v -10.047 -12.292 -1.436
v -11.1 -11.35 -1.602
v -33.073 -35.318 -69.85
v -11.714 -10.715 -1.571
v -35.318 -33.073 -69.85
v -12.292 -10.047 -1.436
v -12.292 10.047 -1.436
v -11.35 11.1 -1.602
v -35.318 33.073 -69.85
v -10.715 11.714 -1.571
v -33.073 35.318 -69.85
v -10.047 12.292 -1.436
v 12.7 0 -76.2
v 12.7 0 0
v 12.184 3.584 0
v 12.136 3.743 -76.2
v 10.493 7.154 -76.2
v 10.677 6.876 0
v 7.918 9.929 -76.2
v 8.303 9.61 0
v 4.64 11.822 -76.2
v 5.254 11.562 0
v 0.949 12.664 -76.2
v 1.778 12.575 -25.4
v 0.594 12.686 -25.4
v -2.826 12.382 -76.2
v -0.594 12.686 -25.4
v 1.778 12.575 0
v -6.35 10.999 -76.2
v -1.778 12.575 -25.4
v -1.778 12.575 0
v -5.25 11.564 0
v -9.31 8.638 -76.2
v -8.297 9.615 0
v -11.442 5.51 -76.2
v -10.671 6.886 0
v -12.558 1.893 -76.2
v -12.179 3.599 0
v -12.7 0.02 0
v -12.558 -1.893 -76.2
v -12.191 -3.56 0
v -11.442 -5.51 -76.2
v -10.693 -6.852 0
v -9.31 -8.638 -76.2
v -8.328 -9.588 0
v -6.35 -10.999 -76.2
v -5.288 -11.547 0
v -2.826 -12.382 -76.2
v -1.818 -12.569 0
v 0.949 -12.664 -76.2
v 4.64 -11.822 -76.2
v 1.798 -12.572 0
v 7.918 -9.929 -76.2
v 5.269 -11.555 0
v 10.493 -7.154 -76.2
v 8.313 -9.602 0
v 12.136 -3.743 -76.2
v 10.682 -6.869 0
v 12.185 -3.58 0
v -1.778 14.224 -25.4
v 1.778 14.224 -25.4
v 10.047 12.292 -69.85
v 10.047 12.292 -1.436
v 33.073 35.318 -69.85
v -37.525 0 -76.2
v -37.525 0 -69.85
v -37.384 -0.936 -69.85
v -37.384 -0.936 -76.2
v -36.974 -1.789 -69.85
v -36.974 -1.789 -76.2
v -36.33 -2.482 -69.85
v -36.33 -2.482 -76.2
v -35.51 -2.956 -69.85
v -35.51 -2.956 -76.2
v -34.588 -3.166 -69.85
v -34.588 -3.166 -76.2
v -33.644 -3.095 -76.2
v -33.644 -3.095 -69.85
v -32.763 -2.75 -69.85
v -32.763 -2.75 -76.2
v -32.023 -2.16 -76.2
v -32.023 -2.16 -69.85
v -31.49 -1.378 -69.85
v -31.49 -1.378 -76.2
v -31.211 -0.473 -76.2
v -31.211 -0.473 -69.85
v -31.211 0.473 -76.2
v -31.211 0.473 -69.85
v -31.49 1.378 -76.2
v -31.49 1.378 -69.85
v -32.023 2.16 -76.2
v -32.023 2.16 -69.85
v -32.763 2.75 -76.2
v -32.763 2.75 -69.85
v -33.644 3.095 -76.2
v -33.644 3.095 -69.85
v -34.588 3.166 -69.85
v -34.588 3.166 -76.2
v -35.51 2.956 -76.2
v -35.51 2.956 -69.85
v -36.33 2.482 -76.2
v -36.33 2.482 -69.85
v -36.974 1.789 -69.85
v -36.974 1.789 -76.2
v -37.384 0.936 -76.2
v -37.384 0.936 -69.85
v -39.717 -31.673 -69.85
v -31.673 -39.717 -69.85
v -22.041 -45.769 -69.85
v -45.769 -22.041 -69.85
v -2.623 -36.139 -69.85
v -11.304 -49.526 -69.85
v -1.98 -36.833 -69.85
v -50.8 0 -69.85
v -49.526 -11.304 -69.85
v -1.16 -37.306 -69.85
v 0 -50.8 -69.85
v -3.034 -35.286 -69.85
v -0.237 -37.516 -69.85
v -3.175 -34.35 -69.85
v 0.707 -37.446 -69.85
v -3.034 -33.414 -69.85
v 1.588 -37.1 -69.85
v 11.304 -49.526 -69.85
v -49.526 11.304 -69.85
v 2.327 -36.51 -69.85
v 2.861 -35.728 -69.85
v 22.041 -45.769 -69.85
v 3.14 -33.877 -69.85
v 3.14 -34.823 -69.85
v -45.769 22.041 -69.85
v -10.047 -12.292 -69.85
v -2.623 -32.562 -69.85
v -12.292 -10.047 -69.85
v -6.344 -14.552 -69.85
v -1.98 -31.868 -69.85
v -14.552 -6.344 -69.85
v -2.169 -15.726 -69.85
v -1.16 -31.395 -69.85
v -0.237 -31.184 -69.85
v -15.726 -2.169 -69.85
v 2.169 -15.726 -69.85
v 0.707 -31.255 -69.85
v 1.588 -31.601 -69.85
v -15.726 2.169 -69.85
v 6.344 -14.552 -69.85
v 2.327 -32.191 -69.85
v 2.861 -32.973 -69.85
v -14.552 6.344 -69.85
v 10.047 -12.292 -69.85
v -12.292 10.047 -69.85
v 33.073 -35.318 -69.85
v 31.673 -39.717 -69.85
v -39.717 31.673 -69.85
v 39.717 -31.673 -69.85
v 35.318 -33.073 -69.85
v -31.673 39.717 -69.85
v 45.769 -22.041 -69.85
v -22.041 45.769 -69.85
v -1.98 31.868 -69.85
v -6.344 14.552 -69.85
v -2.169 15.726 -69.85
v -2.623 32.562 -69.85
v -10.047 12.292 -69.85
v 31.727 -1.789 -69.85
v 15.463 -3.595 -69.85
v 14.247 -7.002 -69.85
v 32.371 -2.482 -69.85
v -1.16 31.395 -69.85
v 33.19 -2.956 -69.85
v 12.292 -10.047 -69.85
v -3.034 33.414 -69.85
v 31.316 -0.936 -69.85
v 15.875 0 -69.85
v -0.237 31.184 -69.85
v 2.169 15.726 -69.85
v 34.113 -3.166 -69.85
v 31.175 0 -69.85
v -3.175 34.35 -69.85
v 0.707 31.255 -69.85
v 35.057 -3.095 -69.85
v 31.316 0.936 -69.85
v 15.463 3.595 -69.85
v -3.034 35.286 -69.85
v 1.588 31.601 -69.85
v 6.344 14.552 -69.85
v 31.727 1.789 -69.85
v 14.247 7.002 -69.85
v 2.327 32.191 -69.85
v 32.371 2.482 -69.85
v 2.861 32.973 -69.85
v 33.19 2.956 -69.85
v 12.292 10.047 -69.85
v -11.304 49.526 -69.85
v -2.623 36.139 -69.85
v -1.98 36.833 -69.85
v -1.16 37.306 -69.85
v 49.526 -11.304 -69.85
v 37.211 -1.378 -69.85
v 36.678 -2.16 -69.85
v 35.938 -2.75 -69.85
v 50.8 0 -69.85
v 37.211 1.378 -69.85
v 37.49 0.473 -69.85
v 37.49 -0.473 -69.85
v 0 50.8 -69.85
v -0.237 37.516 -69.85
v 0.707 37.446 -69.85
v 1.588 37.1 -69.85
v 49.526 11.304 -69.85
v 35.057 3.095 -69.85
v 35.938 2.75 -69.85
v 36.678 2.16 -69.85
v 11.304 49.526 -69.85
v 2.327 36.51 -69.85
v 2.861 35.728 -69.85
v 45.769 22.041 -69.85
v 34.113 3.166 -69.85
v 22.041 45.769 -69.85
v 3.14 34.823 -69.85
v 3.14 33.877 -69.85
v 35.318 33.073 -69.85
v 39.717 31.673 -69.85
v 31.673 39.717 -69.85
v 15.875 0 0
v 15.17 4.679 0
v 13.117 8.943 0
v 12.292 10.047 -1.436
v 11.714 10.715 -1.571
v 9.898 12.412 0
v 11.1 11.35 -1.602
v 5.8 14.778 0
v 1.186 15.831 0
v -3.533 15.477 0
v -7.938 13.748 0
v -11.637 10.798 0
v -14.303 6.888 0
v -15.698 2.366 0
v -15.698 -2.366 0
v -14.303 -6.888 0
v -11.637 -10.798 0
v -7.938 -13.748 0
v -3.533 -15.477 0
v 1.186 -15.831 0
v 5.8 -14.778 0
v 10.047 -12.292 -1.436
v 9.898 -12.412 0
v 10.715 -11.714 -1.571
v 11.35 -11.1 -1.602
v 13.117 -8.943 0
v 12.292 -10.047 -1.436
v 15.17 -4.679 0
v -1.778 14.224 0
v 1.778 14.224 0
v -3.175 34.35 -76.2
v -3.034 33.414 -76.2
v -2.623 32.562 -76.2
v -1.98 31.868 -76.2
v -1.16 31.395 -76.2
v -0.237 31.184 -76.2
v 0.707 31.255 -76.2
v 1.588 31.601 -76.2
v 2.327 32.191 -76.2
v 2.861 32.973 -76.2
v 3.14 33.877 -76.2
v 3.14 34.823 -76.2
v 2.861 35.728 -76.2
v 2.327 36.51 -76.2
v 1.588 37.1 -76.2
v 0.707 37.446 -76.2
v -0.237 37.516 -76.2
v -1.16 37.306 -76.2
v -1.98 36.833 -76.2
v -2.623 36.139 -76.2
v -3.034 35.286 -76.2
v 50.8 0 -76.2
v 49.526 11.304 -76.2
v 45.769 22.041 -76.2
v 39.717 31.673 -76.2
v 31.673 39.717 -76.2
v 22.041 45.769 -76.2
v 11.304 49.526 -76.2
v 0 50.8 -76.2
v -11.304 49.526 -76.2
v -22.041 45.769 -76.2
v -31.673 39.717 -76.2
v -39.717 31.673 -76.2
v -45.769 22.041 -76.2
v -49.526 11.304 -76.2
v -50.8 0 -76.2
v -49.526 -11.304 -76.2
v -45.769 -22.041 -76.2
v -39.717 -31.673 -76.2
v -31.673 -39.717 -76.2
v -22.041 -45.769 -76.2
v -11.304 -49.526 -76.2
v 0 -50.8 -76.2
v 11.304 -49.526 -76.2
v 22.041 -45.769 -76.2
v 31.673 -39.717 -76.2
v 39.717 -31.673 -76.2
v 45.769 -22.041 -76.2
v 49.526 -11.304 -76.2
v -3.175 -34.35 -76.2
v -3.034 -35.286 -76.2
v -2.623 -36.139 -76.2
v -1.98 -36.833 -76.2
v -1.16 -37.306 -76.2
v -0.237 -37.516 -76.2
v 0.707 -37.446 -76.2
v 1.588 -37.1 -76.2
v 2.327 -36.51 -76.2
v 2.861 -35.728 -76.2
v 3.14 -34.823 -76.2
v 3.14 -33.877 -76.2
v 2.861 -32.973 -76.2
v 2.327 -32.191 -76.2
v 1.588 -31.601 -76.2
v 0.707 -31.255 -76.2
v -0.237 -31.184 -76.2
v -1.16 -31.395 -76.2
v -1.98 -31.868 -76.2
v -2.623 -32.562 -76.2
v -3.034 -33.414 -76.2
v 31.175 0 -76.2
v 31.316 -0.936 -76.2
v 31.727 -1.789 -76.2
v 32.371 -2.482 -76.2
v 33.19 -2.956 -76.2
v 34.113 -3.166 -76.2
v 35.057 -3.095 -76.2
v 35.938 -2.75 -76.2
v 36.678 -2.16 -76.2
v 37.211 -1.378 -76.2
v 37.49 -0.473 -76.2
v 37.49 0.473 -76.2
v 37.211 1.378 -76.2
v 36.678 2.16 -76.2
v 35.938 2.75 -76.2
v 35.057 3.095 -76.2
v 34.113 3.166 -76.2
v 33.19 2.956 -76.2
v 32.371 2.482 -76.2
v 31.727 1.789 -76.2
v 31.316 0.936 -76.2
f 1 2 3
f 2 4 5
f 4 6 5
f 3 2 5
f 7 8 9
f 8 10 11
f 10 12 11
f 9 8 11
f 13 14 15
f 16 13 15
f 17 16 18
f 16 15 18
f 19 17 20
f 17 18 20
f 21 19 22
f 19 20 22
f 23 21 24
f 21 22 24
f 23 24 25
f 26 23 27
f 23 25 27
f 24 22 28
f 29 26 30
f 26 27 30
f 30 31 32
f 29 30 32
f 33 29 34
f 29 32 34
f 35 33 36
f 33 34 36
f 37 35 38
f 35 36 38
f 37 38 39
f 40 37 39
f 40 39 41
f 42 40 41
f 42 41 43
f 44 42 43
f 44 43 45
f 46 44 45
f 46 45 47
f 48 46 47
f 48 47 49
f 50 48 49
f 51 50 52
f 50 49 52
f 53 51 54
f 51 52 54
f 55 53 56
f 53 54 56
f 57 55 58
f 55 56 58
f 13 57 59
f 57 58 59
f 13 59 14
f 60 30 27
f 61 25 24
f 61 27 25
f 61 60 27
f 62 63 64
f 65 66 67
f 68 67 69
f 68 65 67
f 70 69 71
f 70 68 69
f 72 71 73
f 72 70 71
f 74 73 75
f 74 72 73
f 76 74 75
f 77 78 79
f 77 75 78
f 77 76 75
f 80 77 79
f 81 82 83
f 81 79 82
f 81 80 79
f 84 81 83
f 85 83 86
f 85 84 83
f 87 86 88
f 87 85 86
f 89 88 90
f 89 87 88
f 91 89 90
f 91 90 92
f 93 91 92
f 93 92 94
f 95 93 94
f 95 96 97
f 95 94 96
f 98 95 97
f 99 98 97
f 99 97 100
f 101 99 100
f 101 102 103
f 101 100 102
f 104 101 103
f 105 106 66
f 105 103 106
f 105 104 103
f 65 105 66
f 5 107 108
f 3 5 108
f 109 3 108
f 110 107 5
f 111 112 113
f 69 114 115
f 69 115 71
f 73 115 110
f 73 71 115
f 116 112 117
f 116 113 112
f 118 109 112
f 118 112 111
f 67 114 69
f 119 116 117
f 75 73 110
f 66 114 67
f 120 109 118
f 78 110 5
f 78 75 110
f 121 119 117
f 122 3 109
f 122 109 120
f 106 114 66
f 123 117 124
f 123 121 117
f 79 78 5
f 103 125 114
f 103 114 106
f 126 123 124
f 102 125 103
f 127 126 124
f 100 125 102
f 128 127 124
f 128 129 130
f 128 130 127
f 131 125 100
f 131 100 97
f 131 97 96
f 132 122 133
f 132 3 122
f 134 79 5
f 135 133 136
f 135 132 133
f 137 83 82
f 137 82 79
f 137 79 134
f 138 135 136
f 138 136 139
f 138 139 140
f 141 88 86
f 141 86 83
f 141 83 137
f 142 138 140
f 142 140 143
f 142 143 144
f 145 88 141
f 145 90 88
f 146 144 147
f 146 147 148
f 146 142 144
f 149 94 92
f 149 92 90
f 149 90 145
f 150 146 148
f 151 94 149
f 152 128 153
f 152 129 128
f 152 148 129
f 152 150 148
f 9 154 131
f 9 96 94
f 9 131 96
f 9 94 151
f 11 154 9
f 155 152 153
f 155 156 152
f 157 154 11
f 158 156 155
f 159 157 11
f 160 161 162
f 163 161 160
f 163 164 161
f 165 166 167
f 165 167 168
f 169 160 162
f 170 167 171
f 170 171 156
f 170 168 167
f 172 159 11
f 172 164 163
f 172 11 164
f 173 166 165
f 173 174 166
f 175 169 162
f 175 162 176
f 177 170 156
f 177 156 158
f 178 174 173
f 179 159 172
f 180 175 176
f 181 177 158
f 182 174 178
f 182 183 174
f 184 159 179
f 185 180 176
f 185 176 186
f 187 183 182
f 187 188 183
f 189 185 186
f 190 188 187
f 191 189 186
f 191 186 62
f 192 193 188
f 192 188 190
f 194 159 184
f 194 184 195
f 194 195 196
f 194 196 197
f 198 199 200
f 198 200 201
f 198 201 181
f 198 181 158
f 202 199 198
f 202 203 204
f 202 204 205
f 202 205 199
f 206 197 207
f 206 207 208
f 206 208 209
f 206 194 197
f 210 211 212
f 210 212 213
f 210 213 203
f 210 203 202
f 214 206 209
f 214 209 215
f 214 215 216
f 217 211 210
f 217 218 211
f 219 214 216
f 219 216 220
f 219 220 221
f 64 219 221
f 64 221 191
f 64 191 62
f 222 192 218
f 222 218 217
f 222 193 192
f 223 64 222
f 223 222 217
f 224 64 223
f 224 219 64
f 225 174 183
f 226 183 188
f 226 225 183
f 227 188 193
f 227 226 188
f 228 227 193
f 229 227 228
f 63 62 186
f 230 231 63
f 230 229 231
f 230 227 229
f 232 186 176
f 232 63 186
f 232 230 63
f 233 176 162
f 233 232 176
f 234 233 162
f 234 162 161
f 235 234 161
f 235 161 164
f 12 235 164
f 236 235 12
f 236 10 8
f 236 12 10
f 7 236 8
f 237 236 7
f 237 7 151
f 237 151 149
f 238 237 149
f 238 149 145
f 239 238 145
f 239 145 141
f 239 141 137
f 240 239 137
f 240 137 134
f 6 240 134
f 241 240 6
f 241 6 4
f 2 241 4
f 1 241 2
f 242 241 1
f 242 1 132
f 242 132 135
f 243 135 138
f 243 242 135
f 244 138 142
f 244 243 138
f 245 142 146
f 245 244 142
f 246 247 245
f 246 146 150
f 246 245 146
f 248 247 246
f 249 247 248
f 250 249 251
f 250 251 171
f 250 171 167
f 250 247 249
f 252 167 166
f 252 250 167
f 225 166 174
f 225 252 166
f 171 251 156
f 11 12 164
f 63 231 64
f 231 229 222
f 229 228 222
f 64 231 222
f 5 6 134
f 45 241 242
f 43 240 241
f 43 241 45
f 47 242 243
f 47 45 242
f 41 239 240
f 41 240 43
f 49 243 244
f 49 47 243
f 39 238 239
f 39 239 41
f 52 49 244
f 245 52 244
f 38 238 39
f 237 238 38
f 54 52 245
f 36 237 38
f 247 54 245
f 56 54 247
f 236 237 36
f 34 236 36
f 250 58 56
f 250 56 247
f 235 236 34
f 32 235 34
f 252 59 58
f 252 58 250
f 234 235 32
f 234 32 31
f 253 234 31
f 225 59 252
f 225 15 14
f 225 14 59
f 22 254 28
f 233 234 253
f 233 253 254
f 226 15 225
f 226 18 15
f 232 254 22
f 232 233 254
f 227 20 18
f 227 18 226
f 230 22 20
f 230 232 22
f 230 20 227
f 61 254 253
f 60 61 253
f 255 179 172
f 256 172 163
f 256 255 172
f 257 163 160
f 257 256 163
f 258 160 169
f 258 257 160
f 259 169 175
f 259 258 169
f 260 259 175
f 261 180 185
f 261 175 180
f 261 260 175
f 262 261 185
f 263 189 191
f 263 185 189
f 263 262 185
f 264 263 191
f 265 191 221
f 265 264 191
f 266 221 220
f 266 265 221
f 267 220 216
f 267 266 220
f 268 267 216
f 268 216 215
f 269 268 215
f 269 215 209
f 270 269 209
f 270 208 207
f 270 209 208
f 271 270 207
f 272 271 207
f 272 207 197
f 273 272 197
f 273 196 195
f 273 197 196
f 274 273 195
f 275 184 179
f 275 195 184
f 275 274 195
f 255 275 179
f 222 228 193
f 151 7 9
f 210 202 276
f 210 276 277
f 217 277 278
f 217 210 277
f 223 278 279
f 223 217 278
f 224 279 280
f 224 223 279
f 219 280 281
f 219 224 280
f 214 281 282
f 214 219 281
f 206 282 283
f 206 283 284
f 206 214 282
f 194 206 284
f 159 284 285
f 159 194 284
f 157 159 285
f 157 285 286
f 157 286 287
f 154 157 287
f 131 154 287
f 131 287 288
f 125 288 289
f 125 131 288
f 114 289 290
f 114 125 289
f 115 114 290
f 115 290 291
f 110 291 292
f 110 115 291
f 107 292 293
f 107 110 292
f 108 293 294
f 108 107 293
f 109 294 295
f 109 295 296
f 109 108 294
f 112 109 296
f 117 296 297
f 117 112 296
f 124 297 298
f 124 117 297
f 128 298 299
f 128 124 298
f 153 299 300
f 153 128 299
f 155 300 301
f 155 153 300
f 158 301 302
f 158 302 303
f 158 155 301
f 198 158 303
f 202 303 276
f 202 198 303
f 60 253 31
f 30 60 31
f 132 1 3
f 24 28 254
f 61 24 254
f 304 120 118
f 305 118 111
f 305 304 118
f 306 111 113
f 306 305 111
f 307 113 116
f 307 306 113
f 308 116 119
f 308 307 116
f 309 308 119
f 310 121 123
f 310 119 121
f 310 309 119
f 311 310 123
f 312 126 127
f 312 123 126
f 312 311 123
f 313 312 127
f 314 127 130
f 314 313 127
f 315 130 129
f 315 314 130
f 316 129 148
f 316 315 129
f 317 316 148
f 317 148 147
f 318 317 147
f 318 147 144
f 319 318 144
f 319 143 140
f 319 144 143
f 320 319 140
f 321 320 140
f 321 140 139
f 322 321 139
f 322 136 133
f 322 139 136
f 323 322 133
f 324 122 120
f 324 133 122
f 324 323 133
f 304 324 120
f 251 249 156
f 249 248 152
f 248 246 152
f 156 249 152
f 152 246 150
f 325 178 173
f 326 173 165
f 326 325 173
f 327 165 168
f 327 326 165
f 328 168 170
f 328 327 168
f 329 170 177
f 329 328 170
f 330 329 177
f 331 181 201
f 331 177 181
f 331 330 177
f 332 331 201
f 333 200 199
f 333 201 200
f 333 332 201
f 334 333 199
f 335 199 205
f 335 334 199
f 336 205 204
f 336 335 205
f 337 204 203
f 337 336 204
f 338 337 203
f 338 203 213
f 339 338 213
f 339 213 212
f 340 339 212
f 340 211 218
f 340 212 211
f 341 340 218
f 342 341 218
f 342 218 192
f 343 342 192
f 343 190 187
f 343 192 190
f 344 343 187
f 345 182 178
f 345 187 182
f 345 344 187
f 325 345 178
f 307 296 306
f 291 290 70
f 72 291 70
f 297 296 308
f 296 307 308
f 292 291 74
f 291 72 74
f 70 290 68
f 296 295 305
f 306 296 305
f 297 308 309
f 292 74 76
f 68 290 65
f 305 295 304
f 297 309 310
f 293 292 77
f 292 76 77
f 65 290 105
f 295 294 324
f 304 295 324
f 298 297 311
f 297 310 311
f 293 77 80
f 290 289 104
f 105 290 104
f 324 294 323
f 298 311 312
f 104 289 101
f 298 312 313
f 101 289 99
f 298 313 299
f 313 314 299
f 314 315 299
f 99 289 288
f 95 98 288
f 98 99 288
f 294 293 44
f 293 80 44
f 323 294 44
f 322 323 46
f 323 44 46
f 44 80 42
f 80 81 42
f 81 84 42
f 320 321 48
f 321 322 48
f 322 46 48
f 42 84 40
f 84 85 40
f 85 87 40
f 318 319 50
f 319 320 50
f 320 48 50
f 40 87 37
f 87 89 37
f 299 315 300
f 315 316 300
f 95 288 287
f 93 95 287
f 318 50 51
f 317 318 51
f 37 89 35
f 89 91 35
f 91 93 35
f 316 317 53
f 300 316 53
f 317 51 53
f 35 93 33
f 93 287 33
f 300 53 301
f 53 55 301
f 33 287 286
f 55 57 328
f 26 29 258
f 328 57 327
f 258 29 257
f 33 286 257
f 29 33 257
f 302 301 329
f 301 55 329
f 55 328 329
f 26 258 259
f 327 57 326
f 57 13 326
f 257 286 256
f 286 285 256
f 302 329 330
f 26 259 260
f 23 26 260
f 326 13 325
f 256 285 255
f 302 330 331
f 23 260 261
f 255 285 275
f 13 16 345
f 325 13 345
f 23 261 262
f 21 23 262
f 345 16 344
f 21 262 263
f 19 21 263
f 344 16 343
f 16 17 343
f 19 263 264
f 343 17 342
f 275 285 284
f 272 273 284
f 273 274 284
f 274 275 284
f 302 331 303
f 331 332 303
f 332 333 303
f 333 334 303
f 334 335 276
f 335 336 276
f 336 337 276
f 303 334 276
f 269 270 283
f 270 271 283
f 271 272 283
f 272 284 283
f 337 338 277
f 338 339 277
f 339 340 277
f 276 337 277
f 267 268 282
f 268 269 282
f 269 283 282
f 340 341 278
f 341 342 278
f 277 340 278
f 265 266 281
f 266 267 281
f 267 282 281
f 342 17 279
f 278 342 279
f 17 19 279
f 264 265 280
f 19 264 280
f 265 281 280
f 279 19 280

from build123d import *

# Parameters (mm, degrees)
SKETCH1_R         = 15.875
SKETCH1_R_2       = 12.7
EXTRUDE1_DEPTH    = 76.2
EXTRUDE2_DEPTH    = 25.4
EXTRUDE3_START    = 6.35
SKETCH3_R         = 50.8
SKETCH3_R_2       = 15.875
EXTRUDE3_DEPTH    = 6.35
SKETCH4_R         = 3.175
EXTRUDE5_DEPTH    = 7.62
RIB4_REACH        = 106.727
SKETCH6_WALL_W    = 287.037040946
SKETCH6_WALL_H    = 3.175
CIRPATTERN1_COUNT = 4


with BuildPart() as part:
    # Sketch1 → Extrude1 (new body)
    with BuildSketch(Plane.XY):
        Circle(SKETCH1_R)
        Circle(SKETCH1_R_2, mode=Mode.SUBTRACT)
    extrude(amount=-EXTRUDE1_DEPTH)

    # Sketch2 → Extrude2 (cut)
    with BuildSketch(Plane.XY):
        Polygon((1.778, 12.7), (1.778, 14.224), (-1.778, 14.224), (-1.778, 12.7), (-1.778, 12.361177694), (1.778, 12.361177694), align=None)
    extrude(amount=-EXTRUDE2_DEPTH, mode=Mode.SUBTRACT)

    # Sketch3 → Extrude3 (add)
    with BuildSketch(Plane.XY.offset(-76.2).offset(EXTRUDE3_START)):
        Circle(SKETCH3_R)
        Circle(SKETCH3_R_2, mode=Mode.SUBTRACT)
    extrude(amount=-EXTRUDE3_DEPTH)

    # Sketch4 → Extrude5 (cut)
    with BuildSketch(Plane.XY.offset(-76.2)):
        with Locations(Location((0, 34.350268622, 0), (0, 0, 180))):
            Circle(SKETCH4_R)
        with Locations(Location((34.350268622, 0, 0), (0, 0, 180))):
            Circle(SKETCH4_R)
        with Locations(Location((0, -34.350268622, 0), (0, 0, 180))):
            Circle(SKETCH4_R)
        with Locations(Location((-34.350268622, 0, 0), (0, 0, 180))):
            Circle(SKETCH4_R)
    extrude(amount=EXTRUDE5_DEPTH, mode=Mode.SUBTRACT)

    # Sketch6 wall → Rib4 (add, up to next)
    with BuildSketch(Plane(origin=(22.710403549, -22.710403549, -35.726788107), x_dir=(0.303905417501, -0.303905417501, -0.902930226777), z_dir=(-0.638468086292, 0.638468086292, -0.429787163108)), mode=Mode.PRIVATE) as rib4_sk1:
        Rectangle(SKETCH6_WALL_W, SKETCH6_WALL_H)
    rib4_tool1 = extrude(rib4_sk1.sketch, amount=RIB4_REACH, mode=Mode.PRIVATE) - part.part
    rib4 = rib4_tool1.solids().sort_by_distance((22.710403549, -22.710403549, -35.726788107))[0]
    add(rib4)

    # CirPattern1: Rib4 ×4 about axis
    cirpattern1_axis = Axis((0, 0, 0), (0, 0, 1))
    for i in range(1, CIRPATTERN1_COUNT):
        add(rib4.rotate(cirpattern1_axis, i * 360 / CIRPATTERN1_COUNT))


solid = part.part
